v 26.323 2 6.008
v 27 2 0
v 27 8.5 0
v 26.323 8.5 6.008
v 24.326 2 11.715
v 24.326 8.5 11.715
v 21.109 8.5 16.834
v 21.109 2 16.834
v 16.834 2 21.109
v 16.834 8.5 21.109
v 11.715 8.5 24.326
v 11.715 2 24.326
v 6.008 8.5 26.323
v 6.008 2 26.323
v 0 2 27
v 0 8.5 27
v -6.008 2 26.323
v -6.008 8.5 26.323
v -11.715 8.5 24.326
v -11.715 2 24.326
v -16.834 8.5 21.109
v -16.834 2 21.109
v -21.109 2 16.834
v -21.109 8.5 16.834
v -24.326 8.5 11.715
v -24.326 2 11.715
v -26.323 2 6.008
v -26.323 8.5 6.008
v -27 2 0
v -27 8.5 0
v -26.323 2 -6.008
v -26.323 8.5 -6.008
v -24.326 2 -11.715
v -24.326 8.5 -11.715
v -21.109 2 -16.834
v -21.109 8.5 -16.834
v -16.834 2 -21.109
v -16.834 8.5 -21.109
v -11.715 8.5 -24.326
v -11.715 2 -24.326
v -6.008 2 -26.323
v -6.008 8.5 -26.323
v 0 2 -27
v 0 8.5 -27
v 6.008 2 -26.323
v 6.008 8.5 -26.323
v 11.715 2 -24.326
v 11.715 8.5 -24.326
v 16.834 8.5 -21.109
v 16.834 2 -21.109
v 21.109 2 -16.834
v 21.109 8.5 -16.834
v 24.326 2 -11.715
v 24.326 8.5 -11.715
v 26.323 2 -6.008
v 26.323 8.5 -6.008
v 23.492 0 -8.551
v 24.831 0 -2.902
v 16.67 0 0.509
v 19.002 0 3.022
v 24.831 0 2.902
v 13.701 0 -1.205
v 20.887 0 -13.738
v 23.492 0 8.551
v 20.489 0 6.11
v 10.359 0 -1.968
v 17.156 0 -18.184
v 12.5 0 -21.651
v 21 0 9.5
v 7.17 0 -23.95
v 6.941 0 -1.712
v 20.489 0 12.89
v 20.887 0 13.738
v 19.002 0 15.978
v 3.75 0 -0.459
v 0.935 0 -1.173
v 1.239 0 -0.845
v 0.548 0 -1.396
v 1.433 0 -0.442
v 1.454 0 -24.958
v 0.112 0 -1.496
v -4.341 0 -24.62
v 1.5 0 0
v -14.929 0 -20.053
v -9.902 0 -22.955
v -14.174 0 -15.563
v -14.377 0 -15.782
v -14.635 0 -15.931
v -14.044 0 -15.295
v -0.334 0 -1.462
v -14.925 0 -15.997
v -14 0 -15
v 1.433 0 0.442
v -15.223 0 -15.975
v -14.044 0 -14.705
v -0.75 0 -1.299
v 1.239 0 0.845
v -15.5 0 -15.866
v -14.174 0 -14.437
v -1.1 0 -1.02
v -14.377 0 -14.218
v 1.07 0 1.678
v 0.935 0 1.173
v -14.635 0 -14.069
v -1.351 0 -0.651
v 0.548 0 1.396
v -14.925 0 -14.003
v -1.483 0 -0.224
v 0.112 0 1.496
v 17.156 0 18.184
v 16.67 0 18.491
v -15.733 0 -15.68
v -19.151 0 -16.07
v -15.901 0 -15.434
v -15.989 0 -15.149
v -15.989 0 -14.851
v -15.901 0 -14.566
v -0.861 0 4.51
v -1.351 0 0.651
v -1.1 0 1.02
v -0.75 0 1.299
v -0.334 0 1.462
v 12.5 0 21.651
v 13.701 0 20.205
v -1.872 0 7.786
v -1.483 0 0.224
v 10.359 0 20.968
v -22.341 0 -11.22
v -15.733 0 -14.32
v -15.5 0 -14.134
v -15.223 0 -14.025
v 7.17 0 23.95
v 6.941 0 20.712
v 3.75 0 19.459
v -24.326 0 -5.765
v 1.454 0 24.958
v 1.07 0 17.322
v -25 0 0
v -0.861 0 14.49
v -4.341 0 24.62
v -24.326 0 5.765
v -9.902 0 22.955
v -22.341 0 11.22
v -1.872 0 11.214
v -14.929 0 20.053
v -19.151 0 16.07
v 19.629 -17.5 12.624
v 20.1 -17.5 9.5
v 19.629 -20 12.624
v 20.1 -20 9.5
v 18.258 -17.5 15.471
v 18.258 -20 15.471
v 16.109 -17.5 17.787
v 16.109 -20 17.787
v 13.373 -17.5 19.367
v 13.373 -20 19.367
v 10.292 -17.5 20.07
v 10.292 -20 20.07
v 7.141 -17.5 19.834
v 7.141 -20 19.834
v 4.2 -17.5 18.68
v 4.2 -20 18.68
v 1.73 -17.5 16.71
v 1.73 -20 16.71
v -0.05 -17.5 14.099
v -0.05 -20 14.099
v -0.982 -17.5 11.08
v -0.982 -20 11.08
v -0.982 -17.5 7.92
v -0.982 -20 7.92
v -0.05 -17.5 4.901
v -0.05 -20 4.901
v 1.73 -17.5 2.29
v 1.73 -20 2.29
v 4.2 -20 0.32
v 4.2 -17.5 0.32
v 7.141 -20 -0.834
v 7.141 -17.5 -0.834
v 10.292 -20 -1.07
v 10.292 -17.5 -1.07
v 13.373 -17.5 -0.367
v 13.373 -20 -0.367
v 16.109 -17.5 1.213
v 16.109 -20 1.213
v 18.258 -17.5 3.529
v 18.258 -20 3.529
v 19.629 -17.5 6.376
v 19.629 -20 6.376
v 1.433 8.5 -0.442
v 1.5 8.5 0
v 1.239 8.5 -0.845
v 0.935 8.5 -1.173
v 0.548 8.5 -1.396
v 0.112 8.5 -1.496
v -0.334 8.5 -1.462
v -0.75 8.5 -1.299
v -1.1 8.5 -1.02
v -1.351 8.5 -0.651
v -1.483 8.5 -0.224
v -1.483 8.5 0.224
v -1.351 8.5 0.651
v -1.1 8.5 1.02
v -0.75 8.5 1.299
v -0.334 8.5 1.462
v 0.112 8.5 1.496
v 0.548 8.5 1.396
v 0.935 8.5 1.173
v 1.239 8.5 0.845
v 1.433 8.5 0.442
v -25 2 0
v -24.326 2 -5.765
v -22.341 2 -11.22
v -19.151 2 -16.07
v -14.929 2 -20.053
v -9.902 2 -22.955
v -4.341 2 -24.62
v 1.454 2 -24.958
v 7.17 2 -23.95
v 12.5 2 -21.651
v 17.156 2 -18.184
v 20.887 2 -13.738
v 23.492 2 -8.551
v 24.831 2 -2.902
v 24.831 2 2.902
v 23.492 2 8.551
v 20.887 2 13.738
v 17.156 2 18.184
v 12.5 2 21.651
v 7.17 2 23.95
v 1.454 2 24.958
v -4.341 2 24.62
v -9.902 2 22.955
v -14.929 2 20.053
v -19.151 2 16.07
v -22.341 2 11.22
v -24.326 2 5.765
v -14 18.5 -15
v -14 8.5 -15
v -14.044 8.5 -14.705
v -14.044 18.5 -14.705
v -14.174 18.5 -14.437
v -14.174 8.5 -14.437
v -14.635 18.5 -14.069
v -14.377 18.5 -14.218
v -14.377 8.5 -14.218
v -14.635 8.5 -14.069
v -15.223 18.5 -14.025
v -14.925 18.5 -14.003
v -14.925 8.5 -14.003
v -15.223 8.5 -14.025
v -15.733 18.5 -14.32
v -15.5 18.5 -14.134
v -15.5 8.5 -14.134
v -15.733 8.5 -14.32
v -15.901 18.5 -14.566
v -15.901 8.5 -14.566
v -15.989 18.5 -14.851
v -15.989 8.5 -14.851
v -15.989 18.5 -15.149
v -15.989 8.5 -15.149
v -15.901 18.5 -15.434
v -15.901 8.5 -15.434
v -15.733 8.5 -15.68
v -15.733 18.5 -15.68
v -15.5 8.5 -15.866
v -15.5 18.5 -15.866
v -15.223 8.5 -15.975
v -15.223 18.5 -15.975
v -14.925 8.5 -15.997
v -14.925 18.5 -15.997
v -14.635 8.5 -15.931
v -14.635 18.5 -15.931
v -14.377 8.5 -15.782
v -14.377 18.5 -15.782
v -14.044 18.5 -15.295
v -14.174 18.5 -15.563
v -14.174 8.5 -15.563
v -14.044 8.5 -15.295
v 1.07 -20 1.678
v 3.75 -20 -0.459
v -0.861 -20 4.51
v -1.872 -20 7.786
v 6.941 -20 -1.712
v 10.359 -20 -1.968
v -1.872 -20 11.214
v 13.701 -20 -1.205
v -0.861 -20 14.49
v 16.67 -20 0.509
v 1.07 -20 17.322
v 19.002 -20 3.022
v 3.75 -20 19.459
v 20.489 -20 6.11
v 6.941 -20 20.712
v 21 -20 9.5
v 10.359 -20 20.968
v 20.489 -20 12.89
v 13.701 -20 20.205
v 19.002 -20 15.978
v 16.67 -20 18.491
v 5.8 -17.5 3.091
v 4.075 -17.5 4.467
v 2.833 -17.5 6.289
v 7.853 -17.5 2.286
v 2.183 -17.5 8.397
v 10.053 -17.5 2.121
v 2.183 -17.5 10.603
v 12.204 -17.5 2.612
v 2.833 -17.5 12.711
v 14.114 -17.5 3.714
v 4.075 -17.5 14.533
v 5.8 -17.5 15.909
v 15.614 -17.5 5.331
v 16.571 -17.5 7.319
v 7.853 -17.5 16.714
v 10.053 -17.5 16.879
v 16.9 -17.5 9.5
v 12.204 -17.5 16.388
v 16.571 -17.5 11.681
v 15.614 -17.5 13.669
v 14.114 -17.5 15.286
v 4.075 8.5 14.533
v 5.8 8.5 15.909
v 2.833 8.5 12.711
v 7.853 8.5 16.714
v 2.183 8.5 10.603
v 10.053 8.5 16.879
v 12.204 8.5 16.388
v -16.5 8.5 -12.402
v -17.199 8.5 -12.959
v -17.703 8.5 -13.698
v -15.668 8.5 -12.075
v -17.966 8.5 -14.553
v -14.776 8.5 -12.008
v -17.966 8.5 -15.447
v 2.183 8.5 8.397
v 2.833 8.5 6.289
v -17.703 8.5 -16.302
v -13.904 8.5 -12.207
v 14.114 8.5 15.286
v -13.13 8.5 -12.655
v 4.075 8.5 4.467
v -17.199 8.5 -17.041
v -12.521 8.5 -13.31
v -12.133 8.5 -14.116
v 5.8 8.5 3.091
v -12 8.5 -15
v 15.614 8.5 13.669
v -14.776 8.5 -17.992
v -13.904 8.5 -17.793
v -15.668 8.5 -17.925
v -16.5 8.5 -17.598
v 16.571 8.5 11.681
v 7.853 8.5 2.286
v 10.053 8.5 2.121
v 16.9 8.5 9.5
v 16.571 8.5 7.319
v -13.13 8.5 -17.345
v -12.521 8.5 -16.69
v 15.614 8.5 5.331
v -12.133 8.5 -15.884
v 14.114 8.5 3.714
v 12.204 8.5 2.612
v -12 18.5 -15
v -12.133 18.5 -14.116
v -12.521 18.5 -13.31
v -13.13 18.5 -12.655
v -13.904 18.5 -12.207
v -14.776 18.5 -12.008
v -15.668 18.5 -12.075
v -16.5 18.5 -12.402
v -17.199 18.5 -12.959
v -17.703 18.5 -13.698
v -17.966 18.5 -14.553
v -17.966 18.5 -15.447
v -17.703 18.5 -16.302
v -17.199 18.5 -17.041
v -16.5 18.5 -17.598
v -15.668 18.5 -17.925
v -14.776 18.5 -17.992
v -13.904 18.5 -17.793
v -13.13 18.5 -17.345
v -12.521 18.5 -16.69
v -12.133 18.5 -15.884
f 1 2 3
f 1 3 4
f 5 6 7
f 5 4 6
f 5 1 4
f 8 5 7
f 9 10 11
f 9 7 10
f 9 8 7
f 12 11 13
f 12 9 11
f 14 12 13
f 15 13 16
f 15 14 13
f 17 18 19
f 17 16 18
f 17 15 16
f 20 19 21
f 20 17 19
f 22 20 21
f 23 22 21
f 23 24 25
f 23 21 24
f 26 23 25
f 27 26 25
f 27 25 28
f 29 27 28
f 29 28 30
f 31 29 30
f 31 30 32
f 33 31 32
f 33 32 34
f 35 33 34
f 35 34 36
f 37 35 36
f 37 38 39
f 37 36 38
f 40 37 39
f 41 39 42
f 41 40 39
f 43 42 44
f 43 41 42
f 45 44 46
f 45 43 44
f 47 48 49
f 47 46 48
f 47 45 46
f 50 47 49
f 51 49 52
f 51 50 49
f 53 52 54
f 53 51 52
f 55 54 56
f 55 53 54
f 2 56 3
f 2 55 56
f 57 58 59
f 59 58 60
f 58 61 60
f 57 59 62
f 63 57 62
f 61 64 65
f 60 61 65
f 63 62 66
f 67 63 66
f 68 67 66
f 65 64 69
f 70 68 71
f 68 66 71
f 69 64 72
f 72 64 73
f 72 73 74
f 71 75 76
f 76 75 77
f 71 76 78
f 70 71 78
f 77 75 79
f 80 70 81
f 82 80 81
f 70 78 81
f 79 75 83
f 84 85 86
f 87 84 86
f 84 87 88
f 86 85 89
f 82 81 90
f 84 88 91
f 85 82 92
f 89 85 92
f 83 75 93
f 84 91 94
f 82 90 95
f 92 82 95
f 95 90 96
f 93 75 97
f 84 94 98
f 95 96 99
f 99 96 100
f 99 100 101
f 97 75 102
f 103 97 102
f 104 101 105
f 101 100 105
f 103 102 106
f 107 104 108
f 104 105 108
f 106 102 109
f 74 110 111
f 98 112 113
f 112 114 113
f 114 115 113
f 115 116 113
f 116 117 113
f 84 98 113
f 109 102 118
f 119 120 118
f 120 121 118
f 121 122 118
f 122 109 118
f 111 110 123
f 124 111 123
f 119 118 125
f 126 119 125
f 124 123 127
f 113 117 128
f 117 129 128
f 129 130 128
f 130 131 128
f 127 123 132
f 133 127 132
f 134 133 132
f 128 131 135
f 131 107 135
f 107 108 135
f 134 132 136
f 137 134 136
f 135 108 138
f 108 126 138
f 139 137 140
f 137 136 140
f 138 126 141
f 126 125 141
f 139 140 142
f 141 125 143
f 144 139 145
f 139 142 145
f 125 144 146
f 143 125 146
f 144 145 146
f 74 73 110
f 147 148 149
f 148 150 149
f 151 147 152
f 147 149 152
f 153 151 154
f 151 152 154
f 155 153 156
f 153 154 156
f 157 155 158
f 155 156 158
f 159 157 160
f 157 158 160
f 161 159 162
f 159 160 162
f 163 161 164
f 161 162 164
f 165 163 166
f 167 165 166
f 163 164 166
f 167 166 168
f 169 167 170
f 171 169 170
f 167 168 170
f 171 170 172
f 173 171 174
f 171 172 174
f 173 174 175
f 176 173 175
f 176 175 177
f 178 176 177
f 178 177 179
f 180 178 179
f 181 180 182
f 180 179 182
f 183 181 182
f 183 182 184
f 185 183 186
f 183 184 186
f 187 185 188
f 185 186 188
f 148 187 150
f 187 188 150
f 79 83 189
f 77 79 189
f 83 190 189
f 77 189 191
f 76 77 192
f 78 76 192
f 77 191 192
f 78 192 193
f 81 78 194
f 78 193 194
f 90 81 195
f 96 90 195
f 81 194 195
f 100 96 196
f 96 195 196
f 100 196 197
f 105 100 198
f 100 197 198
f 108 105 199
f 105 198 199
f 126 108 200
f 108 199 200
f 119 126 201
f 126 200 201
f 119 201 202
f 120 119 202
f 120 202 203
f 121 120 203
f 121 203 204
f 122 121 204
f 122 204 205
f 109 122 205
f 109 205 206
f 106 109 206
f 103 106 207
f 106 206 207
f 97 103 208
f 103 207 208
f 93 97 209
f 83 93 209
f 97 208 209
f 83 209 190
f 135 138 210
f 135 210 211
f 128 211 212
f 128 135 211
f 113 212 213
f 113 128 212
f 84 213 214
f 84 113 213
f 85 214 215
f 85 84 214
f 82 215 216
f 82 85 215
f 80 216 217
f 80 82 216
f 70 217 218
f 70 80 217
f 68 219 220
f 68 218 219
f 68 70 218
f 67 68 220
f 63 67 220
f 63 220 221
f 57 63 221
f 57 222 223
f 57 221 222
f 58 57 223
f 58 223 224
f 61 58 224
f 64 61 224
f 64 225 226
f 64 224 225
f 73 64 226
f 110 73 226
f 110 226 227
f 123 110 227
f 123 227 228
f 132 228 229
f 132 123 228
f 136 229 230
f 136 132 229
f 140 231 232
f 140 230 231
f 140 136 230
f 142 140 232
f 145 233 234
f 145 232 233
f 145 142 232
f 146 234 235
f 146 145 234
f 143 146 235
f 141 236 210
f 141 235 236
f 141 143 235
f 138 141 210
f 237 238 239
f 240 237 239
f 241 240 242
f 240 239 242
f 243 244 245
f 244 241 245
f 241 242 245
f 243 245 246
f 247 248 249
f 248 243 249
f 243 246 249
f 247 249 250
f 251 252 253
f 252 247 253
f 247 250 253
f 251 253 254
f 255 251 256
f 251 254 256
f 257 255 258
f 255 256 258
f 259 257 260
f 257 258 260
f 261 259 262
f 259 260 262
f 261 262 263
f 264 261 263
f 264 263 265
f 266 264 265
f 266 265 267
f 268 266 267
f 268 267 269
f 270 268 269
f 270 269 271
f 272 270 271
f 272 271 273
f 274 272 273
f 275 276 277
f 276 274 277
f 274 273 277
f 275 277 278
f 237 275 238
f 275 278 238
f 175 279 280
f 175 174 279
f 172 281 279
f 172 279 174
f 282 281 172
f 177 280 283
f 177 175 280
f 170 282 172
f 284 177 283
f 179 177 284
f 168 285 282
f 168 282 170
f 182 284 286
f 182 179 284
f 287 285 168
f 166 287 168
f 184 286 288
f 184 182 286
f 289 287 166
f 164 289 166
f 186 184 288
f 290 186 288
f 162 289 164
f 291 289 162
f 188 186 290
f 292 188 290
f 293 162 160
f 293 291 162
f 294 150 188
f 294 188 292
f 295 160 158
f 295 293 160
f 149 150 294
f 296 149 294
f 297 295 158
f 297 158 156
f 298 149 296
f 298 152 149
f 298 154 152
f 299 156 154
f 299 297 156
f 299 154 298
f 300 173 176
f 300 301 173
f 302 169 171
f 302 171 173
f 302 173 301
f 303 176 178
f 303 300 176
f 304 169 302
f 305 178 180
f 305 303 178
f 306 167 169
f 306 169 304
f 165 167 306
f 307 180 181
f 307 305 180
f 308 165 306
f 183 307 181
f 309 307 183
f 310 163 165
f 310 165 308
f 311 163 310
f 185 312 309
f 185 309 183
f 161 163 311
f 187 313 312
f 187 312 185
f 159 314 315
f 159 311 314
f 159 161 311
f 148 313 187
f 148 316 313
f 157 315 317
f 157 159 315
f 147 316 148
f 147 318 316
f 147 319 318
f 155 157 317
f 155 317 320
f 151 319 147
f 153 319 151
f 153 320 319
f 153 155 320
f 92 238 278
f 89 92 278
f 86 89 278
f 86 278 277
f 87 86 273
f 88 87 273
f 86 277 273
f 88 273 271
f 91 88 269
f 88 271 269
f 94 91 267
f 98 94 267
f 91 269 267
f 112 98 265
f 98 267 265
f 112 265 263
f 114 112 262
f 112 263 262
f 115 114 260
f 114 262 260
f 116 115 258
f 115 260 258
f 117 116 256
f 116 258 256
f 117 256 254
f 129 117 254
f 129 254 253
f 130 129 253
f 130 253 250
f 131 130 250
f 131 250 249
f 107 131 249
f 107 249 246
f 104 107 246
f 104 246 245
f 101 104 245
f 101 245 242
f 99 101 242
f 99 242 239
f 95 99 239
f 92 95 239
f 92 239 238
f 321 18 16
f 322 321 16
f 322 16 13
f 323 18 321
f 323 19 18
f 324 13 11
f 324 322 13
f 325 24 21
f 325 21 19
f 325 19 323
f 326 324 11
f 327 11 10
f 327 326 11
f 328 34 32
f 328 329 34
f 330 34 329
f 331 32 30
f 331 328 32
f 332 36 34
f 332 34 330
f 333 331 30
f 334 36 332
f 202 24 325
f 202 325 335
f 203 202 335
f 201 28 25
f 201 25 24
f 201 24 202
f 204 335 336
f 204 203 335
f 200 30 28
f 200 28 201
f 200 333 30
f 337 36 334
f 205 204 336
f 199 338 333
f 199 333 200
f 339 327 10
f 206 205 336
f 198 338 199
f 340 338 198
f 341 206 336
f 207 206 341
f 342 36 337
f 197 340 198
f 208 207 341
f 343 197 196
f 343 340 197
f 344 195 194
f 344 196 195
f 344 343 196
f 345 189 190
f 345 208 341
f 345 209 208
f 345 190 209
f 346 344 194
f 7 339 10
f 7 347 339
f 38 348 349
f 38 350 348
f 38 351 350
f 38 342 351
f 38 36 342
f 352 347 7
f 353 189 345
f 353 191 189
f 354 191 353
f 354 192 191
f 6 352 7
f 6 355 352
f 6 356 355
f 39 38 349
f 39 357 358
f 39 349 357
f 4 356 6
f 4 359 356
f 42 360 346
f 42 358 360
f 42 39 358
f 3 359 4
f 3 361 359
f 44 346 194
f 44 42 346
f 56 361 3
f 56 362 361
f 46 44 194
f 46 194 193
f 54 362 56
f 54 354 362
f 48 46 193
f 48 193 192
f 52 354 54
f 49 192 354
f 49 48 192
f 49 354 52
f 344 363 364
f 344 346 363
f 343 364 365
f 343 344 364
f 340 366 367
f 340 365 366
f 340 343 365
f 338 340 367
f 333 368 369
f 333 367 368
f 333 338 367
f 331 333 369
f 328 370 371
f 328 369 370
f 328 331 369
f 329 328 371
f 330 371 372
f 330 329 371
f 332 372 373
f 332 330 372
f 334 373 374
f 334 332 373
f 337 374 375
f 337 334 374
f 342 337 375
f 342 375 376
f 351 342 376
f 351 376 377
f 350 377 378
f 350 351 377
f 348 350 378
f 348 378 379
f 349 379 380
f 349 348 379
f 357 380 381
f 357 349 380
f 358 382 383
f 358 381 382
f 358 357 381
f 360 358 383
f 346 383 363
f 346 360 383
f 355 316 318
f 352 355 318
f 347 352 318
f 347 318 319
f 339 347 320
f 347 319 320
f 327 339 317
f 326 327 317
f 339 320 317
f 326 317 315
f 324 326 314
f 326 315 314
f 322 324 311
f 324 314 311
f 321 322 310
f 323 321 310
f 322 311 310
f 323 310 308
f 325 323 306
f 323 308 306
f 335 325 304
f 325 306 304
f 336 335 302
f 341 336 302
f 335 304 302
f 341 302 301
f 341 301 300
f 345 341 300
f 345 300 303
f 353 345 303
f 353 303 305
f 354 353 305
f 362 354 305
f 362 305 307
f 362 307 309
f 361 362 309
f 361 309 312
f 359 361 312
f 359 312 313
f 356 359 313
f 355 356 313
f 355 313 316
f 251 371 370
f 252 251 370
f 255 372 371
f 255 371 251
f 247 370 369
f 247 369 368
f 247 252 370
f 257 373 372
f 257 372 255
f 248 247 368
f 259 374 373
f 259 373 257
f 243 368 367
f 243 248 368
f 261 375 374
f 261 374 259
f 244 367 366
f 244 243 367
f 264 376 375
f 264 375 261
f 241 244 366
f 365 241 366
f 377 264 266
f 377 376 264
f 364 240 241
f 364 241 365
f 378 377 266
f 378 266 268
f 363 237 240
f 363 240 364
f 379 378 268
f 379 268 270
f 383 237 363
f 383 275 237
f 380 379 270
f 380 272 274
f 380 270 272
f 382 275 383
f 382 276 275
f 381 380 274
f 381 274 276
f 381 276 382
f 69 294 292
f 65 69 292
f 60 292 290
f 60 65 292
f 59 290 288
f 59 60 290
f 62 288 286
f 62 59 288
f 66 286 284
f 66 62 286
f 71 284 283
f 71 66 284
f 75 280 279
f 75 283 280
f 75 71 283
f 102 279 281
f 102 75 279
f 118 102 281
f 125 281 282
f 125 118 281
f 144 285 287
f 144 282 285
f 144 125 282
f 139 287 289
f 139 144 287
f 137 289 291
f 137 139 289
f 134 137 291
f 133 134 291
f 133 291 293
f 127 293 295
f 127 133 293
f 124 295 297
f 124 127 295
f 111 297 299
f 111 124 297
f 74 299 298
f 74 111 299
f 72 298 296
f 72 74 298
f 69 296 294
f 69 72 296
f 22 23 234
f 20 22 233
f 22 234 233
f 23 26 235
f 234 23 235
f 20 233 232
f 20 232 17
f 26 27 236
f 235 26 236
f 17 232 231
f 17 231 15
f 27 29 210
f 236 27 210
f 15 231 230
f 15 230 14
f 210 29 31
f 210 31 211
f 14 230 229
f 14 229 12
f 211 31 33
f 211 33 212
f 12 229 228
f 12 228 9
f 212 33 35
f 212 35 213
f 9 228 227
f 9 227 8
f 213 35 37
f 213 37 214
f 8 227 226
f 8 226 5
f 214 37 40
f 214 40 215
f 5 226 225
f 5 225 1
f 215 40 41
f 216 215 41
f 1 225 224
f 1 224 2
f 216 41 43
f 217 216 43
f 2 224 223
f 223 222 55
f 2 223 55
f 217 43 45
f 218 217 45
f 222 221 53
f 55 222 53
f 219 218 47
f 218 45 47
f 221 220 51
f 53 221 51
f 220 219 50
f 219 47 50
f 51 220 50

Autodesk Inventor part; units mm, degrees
ref_plane "YZ Plane" through (0, 0, 0) normal (1, 0, 0) x (0, 1, 0)
ref_plane "XZ Plane" through (0, 0, 0) normal (0, 1, 0) x (-1, 0, 0)
ref_plane "XY Plane" through (0, 0, 0) normal (0, 0, 1) x (1, 0, 0)
sketch "Sketch1" plane through (0, 0, 0) normal (0, 1, 0) x (-1, 0, 0)
  circle A0 centre (0, 0) radius 25
  dimension "d0" = 50
extrude "Extrusion1" add sketch "Sketch1" along normal blind 2
sketch "Sketch3" plane through (0, 2, 0) normal (0, 1, 0) x (1, 0, 0)
  circle A0 centre (0, 0) radius 27
  circle A1 centre (0, 0) radius 25 projected
  dimension "d3" = 2
extrude "Extrusion2" add sketch "Sketch3" along normal blind 6.5 contours A0 | A1
sketch "Sketch4" plane through (0, 8.5, 0) normal (0, 1, 0) x (1, 0, 0)
  circle A0 centre (0, 0) radius 1.5
  circle A1 centre (-15, 15) radius 1
  dimension "d6" = 3
  dimension "d8" = 15
  dimension "d9" = 15
  dimension "d10" = 2
extrude "Extrusion3" cut sketch "Sketch4" against normal through all
sketch "Sketch5" plane through (0, 8.5, 0) normal (0, 1, 0) x (1, 0, 0)
  circle A0 centre (-15, 15) radius 3
  circle A1 centre (-15, 15) radius 1 projected
  point P0 (0, 0)
  dimension "d14" = 2
extrude "Extrusion4" add sketch "Sketch5" along normal blind 10
thread "Thread1" size "M6x1" class "6g" standard "ANSI Metric M Profile" length 9
sketch "Sketch10" plane through (0, 0, 0) normal (0, -1, 0) x (1, 0, 0)
  circle A0 centre (9.5, 9.5) radius 11.5
  point P0 (0, 0)
  dimension "d31" = 23
  dimension "d32" = 9.5
  dimension "d33" = 9.5
extrude "Extrusion8" add sketch "Sketch10" along normal blind 20
sketch "Sketch11" plane through (9.5, -20, 9.5) normal (0, -1, 0) x (1, 0, 0)
  circle A0 centre (0, 0) radius 10.6
  circle A1 centre (0, 0) radius 11.5 projected
  point P0 (-9.5, -9.5)
  dimension "d36" = 21.2
extrude "Extrusion9" cut sketch "Sketch11" against normal blind 2.5 contours A0
sketch "Sketch12" plane through (9.5, -17.5, 9.5) normal (0, -1, 0) x (1, 0, 0)
  circle A0 centre (0, 0) radius 7.4
  circle A1 centre (0, 0) radius 10.6 projected
  point P0 (-9.5, -9.5)
  dimension "d39" = 14.8
extrude "Extrusion10" cut sketch "Sketch12" against normal through all contours A0
thread "Thread2" size "M15x1.5" class "6H" standard "ANSI Metric M Profile" length 9
properties part number "TopReactor"
